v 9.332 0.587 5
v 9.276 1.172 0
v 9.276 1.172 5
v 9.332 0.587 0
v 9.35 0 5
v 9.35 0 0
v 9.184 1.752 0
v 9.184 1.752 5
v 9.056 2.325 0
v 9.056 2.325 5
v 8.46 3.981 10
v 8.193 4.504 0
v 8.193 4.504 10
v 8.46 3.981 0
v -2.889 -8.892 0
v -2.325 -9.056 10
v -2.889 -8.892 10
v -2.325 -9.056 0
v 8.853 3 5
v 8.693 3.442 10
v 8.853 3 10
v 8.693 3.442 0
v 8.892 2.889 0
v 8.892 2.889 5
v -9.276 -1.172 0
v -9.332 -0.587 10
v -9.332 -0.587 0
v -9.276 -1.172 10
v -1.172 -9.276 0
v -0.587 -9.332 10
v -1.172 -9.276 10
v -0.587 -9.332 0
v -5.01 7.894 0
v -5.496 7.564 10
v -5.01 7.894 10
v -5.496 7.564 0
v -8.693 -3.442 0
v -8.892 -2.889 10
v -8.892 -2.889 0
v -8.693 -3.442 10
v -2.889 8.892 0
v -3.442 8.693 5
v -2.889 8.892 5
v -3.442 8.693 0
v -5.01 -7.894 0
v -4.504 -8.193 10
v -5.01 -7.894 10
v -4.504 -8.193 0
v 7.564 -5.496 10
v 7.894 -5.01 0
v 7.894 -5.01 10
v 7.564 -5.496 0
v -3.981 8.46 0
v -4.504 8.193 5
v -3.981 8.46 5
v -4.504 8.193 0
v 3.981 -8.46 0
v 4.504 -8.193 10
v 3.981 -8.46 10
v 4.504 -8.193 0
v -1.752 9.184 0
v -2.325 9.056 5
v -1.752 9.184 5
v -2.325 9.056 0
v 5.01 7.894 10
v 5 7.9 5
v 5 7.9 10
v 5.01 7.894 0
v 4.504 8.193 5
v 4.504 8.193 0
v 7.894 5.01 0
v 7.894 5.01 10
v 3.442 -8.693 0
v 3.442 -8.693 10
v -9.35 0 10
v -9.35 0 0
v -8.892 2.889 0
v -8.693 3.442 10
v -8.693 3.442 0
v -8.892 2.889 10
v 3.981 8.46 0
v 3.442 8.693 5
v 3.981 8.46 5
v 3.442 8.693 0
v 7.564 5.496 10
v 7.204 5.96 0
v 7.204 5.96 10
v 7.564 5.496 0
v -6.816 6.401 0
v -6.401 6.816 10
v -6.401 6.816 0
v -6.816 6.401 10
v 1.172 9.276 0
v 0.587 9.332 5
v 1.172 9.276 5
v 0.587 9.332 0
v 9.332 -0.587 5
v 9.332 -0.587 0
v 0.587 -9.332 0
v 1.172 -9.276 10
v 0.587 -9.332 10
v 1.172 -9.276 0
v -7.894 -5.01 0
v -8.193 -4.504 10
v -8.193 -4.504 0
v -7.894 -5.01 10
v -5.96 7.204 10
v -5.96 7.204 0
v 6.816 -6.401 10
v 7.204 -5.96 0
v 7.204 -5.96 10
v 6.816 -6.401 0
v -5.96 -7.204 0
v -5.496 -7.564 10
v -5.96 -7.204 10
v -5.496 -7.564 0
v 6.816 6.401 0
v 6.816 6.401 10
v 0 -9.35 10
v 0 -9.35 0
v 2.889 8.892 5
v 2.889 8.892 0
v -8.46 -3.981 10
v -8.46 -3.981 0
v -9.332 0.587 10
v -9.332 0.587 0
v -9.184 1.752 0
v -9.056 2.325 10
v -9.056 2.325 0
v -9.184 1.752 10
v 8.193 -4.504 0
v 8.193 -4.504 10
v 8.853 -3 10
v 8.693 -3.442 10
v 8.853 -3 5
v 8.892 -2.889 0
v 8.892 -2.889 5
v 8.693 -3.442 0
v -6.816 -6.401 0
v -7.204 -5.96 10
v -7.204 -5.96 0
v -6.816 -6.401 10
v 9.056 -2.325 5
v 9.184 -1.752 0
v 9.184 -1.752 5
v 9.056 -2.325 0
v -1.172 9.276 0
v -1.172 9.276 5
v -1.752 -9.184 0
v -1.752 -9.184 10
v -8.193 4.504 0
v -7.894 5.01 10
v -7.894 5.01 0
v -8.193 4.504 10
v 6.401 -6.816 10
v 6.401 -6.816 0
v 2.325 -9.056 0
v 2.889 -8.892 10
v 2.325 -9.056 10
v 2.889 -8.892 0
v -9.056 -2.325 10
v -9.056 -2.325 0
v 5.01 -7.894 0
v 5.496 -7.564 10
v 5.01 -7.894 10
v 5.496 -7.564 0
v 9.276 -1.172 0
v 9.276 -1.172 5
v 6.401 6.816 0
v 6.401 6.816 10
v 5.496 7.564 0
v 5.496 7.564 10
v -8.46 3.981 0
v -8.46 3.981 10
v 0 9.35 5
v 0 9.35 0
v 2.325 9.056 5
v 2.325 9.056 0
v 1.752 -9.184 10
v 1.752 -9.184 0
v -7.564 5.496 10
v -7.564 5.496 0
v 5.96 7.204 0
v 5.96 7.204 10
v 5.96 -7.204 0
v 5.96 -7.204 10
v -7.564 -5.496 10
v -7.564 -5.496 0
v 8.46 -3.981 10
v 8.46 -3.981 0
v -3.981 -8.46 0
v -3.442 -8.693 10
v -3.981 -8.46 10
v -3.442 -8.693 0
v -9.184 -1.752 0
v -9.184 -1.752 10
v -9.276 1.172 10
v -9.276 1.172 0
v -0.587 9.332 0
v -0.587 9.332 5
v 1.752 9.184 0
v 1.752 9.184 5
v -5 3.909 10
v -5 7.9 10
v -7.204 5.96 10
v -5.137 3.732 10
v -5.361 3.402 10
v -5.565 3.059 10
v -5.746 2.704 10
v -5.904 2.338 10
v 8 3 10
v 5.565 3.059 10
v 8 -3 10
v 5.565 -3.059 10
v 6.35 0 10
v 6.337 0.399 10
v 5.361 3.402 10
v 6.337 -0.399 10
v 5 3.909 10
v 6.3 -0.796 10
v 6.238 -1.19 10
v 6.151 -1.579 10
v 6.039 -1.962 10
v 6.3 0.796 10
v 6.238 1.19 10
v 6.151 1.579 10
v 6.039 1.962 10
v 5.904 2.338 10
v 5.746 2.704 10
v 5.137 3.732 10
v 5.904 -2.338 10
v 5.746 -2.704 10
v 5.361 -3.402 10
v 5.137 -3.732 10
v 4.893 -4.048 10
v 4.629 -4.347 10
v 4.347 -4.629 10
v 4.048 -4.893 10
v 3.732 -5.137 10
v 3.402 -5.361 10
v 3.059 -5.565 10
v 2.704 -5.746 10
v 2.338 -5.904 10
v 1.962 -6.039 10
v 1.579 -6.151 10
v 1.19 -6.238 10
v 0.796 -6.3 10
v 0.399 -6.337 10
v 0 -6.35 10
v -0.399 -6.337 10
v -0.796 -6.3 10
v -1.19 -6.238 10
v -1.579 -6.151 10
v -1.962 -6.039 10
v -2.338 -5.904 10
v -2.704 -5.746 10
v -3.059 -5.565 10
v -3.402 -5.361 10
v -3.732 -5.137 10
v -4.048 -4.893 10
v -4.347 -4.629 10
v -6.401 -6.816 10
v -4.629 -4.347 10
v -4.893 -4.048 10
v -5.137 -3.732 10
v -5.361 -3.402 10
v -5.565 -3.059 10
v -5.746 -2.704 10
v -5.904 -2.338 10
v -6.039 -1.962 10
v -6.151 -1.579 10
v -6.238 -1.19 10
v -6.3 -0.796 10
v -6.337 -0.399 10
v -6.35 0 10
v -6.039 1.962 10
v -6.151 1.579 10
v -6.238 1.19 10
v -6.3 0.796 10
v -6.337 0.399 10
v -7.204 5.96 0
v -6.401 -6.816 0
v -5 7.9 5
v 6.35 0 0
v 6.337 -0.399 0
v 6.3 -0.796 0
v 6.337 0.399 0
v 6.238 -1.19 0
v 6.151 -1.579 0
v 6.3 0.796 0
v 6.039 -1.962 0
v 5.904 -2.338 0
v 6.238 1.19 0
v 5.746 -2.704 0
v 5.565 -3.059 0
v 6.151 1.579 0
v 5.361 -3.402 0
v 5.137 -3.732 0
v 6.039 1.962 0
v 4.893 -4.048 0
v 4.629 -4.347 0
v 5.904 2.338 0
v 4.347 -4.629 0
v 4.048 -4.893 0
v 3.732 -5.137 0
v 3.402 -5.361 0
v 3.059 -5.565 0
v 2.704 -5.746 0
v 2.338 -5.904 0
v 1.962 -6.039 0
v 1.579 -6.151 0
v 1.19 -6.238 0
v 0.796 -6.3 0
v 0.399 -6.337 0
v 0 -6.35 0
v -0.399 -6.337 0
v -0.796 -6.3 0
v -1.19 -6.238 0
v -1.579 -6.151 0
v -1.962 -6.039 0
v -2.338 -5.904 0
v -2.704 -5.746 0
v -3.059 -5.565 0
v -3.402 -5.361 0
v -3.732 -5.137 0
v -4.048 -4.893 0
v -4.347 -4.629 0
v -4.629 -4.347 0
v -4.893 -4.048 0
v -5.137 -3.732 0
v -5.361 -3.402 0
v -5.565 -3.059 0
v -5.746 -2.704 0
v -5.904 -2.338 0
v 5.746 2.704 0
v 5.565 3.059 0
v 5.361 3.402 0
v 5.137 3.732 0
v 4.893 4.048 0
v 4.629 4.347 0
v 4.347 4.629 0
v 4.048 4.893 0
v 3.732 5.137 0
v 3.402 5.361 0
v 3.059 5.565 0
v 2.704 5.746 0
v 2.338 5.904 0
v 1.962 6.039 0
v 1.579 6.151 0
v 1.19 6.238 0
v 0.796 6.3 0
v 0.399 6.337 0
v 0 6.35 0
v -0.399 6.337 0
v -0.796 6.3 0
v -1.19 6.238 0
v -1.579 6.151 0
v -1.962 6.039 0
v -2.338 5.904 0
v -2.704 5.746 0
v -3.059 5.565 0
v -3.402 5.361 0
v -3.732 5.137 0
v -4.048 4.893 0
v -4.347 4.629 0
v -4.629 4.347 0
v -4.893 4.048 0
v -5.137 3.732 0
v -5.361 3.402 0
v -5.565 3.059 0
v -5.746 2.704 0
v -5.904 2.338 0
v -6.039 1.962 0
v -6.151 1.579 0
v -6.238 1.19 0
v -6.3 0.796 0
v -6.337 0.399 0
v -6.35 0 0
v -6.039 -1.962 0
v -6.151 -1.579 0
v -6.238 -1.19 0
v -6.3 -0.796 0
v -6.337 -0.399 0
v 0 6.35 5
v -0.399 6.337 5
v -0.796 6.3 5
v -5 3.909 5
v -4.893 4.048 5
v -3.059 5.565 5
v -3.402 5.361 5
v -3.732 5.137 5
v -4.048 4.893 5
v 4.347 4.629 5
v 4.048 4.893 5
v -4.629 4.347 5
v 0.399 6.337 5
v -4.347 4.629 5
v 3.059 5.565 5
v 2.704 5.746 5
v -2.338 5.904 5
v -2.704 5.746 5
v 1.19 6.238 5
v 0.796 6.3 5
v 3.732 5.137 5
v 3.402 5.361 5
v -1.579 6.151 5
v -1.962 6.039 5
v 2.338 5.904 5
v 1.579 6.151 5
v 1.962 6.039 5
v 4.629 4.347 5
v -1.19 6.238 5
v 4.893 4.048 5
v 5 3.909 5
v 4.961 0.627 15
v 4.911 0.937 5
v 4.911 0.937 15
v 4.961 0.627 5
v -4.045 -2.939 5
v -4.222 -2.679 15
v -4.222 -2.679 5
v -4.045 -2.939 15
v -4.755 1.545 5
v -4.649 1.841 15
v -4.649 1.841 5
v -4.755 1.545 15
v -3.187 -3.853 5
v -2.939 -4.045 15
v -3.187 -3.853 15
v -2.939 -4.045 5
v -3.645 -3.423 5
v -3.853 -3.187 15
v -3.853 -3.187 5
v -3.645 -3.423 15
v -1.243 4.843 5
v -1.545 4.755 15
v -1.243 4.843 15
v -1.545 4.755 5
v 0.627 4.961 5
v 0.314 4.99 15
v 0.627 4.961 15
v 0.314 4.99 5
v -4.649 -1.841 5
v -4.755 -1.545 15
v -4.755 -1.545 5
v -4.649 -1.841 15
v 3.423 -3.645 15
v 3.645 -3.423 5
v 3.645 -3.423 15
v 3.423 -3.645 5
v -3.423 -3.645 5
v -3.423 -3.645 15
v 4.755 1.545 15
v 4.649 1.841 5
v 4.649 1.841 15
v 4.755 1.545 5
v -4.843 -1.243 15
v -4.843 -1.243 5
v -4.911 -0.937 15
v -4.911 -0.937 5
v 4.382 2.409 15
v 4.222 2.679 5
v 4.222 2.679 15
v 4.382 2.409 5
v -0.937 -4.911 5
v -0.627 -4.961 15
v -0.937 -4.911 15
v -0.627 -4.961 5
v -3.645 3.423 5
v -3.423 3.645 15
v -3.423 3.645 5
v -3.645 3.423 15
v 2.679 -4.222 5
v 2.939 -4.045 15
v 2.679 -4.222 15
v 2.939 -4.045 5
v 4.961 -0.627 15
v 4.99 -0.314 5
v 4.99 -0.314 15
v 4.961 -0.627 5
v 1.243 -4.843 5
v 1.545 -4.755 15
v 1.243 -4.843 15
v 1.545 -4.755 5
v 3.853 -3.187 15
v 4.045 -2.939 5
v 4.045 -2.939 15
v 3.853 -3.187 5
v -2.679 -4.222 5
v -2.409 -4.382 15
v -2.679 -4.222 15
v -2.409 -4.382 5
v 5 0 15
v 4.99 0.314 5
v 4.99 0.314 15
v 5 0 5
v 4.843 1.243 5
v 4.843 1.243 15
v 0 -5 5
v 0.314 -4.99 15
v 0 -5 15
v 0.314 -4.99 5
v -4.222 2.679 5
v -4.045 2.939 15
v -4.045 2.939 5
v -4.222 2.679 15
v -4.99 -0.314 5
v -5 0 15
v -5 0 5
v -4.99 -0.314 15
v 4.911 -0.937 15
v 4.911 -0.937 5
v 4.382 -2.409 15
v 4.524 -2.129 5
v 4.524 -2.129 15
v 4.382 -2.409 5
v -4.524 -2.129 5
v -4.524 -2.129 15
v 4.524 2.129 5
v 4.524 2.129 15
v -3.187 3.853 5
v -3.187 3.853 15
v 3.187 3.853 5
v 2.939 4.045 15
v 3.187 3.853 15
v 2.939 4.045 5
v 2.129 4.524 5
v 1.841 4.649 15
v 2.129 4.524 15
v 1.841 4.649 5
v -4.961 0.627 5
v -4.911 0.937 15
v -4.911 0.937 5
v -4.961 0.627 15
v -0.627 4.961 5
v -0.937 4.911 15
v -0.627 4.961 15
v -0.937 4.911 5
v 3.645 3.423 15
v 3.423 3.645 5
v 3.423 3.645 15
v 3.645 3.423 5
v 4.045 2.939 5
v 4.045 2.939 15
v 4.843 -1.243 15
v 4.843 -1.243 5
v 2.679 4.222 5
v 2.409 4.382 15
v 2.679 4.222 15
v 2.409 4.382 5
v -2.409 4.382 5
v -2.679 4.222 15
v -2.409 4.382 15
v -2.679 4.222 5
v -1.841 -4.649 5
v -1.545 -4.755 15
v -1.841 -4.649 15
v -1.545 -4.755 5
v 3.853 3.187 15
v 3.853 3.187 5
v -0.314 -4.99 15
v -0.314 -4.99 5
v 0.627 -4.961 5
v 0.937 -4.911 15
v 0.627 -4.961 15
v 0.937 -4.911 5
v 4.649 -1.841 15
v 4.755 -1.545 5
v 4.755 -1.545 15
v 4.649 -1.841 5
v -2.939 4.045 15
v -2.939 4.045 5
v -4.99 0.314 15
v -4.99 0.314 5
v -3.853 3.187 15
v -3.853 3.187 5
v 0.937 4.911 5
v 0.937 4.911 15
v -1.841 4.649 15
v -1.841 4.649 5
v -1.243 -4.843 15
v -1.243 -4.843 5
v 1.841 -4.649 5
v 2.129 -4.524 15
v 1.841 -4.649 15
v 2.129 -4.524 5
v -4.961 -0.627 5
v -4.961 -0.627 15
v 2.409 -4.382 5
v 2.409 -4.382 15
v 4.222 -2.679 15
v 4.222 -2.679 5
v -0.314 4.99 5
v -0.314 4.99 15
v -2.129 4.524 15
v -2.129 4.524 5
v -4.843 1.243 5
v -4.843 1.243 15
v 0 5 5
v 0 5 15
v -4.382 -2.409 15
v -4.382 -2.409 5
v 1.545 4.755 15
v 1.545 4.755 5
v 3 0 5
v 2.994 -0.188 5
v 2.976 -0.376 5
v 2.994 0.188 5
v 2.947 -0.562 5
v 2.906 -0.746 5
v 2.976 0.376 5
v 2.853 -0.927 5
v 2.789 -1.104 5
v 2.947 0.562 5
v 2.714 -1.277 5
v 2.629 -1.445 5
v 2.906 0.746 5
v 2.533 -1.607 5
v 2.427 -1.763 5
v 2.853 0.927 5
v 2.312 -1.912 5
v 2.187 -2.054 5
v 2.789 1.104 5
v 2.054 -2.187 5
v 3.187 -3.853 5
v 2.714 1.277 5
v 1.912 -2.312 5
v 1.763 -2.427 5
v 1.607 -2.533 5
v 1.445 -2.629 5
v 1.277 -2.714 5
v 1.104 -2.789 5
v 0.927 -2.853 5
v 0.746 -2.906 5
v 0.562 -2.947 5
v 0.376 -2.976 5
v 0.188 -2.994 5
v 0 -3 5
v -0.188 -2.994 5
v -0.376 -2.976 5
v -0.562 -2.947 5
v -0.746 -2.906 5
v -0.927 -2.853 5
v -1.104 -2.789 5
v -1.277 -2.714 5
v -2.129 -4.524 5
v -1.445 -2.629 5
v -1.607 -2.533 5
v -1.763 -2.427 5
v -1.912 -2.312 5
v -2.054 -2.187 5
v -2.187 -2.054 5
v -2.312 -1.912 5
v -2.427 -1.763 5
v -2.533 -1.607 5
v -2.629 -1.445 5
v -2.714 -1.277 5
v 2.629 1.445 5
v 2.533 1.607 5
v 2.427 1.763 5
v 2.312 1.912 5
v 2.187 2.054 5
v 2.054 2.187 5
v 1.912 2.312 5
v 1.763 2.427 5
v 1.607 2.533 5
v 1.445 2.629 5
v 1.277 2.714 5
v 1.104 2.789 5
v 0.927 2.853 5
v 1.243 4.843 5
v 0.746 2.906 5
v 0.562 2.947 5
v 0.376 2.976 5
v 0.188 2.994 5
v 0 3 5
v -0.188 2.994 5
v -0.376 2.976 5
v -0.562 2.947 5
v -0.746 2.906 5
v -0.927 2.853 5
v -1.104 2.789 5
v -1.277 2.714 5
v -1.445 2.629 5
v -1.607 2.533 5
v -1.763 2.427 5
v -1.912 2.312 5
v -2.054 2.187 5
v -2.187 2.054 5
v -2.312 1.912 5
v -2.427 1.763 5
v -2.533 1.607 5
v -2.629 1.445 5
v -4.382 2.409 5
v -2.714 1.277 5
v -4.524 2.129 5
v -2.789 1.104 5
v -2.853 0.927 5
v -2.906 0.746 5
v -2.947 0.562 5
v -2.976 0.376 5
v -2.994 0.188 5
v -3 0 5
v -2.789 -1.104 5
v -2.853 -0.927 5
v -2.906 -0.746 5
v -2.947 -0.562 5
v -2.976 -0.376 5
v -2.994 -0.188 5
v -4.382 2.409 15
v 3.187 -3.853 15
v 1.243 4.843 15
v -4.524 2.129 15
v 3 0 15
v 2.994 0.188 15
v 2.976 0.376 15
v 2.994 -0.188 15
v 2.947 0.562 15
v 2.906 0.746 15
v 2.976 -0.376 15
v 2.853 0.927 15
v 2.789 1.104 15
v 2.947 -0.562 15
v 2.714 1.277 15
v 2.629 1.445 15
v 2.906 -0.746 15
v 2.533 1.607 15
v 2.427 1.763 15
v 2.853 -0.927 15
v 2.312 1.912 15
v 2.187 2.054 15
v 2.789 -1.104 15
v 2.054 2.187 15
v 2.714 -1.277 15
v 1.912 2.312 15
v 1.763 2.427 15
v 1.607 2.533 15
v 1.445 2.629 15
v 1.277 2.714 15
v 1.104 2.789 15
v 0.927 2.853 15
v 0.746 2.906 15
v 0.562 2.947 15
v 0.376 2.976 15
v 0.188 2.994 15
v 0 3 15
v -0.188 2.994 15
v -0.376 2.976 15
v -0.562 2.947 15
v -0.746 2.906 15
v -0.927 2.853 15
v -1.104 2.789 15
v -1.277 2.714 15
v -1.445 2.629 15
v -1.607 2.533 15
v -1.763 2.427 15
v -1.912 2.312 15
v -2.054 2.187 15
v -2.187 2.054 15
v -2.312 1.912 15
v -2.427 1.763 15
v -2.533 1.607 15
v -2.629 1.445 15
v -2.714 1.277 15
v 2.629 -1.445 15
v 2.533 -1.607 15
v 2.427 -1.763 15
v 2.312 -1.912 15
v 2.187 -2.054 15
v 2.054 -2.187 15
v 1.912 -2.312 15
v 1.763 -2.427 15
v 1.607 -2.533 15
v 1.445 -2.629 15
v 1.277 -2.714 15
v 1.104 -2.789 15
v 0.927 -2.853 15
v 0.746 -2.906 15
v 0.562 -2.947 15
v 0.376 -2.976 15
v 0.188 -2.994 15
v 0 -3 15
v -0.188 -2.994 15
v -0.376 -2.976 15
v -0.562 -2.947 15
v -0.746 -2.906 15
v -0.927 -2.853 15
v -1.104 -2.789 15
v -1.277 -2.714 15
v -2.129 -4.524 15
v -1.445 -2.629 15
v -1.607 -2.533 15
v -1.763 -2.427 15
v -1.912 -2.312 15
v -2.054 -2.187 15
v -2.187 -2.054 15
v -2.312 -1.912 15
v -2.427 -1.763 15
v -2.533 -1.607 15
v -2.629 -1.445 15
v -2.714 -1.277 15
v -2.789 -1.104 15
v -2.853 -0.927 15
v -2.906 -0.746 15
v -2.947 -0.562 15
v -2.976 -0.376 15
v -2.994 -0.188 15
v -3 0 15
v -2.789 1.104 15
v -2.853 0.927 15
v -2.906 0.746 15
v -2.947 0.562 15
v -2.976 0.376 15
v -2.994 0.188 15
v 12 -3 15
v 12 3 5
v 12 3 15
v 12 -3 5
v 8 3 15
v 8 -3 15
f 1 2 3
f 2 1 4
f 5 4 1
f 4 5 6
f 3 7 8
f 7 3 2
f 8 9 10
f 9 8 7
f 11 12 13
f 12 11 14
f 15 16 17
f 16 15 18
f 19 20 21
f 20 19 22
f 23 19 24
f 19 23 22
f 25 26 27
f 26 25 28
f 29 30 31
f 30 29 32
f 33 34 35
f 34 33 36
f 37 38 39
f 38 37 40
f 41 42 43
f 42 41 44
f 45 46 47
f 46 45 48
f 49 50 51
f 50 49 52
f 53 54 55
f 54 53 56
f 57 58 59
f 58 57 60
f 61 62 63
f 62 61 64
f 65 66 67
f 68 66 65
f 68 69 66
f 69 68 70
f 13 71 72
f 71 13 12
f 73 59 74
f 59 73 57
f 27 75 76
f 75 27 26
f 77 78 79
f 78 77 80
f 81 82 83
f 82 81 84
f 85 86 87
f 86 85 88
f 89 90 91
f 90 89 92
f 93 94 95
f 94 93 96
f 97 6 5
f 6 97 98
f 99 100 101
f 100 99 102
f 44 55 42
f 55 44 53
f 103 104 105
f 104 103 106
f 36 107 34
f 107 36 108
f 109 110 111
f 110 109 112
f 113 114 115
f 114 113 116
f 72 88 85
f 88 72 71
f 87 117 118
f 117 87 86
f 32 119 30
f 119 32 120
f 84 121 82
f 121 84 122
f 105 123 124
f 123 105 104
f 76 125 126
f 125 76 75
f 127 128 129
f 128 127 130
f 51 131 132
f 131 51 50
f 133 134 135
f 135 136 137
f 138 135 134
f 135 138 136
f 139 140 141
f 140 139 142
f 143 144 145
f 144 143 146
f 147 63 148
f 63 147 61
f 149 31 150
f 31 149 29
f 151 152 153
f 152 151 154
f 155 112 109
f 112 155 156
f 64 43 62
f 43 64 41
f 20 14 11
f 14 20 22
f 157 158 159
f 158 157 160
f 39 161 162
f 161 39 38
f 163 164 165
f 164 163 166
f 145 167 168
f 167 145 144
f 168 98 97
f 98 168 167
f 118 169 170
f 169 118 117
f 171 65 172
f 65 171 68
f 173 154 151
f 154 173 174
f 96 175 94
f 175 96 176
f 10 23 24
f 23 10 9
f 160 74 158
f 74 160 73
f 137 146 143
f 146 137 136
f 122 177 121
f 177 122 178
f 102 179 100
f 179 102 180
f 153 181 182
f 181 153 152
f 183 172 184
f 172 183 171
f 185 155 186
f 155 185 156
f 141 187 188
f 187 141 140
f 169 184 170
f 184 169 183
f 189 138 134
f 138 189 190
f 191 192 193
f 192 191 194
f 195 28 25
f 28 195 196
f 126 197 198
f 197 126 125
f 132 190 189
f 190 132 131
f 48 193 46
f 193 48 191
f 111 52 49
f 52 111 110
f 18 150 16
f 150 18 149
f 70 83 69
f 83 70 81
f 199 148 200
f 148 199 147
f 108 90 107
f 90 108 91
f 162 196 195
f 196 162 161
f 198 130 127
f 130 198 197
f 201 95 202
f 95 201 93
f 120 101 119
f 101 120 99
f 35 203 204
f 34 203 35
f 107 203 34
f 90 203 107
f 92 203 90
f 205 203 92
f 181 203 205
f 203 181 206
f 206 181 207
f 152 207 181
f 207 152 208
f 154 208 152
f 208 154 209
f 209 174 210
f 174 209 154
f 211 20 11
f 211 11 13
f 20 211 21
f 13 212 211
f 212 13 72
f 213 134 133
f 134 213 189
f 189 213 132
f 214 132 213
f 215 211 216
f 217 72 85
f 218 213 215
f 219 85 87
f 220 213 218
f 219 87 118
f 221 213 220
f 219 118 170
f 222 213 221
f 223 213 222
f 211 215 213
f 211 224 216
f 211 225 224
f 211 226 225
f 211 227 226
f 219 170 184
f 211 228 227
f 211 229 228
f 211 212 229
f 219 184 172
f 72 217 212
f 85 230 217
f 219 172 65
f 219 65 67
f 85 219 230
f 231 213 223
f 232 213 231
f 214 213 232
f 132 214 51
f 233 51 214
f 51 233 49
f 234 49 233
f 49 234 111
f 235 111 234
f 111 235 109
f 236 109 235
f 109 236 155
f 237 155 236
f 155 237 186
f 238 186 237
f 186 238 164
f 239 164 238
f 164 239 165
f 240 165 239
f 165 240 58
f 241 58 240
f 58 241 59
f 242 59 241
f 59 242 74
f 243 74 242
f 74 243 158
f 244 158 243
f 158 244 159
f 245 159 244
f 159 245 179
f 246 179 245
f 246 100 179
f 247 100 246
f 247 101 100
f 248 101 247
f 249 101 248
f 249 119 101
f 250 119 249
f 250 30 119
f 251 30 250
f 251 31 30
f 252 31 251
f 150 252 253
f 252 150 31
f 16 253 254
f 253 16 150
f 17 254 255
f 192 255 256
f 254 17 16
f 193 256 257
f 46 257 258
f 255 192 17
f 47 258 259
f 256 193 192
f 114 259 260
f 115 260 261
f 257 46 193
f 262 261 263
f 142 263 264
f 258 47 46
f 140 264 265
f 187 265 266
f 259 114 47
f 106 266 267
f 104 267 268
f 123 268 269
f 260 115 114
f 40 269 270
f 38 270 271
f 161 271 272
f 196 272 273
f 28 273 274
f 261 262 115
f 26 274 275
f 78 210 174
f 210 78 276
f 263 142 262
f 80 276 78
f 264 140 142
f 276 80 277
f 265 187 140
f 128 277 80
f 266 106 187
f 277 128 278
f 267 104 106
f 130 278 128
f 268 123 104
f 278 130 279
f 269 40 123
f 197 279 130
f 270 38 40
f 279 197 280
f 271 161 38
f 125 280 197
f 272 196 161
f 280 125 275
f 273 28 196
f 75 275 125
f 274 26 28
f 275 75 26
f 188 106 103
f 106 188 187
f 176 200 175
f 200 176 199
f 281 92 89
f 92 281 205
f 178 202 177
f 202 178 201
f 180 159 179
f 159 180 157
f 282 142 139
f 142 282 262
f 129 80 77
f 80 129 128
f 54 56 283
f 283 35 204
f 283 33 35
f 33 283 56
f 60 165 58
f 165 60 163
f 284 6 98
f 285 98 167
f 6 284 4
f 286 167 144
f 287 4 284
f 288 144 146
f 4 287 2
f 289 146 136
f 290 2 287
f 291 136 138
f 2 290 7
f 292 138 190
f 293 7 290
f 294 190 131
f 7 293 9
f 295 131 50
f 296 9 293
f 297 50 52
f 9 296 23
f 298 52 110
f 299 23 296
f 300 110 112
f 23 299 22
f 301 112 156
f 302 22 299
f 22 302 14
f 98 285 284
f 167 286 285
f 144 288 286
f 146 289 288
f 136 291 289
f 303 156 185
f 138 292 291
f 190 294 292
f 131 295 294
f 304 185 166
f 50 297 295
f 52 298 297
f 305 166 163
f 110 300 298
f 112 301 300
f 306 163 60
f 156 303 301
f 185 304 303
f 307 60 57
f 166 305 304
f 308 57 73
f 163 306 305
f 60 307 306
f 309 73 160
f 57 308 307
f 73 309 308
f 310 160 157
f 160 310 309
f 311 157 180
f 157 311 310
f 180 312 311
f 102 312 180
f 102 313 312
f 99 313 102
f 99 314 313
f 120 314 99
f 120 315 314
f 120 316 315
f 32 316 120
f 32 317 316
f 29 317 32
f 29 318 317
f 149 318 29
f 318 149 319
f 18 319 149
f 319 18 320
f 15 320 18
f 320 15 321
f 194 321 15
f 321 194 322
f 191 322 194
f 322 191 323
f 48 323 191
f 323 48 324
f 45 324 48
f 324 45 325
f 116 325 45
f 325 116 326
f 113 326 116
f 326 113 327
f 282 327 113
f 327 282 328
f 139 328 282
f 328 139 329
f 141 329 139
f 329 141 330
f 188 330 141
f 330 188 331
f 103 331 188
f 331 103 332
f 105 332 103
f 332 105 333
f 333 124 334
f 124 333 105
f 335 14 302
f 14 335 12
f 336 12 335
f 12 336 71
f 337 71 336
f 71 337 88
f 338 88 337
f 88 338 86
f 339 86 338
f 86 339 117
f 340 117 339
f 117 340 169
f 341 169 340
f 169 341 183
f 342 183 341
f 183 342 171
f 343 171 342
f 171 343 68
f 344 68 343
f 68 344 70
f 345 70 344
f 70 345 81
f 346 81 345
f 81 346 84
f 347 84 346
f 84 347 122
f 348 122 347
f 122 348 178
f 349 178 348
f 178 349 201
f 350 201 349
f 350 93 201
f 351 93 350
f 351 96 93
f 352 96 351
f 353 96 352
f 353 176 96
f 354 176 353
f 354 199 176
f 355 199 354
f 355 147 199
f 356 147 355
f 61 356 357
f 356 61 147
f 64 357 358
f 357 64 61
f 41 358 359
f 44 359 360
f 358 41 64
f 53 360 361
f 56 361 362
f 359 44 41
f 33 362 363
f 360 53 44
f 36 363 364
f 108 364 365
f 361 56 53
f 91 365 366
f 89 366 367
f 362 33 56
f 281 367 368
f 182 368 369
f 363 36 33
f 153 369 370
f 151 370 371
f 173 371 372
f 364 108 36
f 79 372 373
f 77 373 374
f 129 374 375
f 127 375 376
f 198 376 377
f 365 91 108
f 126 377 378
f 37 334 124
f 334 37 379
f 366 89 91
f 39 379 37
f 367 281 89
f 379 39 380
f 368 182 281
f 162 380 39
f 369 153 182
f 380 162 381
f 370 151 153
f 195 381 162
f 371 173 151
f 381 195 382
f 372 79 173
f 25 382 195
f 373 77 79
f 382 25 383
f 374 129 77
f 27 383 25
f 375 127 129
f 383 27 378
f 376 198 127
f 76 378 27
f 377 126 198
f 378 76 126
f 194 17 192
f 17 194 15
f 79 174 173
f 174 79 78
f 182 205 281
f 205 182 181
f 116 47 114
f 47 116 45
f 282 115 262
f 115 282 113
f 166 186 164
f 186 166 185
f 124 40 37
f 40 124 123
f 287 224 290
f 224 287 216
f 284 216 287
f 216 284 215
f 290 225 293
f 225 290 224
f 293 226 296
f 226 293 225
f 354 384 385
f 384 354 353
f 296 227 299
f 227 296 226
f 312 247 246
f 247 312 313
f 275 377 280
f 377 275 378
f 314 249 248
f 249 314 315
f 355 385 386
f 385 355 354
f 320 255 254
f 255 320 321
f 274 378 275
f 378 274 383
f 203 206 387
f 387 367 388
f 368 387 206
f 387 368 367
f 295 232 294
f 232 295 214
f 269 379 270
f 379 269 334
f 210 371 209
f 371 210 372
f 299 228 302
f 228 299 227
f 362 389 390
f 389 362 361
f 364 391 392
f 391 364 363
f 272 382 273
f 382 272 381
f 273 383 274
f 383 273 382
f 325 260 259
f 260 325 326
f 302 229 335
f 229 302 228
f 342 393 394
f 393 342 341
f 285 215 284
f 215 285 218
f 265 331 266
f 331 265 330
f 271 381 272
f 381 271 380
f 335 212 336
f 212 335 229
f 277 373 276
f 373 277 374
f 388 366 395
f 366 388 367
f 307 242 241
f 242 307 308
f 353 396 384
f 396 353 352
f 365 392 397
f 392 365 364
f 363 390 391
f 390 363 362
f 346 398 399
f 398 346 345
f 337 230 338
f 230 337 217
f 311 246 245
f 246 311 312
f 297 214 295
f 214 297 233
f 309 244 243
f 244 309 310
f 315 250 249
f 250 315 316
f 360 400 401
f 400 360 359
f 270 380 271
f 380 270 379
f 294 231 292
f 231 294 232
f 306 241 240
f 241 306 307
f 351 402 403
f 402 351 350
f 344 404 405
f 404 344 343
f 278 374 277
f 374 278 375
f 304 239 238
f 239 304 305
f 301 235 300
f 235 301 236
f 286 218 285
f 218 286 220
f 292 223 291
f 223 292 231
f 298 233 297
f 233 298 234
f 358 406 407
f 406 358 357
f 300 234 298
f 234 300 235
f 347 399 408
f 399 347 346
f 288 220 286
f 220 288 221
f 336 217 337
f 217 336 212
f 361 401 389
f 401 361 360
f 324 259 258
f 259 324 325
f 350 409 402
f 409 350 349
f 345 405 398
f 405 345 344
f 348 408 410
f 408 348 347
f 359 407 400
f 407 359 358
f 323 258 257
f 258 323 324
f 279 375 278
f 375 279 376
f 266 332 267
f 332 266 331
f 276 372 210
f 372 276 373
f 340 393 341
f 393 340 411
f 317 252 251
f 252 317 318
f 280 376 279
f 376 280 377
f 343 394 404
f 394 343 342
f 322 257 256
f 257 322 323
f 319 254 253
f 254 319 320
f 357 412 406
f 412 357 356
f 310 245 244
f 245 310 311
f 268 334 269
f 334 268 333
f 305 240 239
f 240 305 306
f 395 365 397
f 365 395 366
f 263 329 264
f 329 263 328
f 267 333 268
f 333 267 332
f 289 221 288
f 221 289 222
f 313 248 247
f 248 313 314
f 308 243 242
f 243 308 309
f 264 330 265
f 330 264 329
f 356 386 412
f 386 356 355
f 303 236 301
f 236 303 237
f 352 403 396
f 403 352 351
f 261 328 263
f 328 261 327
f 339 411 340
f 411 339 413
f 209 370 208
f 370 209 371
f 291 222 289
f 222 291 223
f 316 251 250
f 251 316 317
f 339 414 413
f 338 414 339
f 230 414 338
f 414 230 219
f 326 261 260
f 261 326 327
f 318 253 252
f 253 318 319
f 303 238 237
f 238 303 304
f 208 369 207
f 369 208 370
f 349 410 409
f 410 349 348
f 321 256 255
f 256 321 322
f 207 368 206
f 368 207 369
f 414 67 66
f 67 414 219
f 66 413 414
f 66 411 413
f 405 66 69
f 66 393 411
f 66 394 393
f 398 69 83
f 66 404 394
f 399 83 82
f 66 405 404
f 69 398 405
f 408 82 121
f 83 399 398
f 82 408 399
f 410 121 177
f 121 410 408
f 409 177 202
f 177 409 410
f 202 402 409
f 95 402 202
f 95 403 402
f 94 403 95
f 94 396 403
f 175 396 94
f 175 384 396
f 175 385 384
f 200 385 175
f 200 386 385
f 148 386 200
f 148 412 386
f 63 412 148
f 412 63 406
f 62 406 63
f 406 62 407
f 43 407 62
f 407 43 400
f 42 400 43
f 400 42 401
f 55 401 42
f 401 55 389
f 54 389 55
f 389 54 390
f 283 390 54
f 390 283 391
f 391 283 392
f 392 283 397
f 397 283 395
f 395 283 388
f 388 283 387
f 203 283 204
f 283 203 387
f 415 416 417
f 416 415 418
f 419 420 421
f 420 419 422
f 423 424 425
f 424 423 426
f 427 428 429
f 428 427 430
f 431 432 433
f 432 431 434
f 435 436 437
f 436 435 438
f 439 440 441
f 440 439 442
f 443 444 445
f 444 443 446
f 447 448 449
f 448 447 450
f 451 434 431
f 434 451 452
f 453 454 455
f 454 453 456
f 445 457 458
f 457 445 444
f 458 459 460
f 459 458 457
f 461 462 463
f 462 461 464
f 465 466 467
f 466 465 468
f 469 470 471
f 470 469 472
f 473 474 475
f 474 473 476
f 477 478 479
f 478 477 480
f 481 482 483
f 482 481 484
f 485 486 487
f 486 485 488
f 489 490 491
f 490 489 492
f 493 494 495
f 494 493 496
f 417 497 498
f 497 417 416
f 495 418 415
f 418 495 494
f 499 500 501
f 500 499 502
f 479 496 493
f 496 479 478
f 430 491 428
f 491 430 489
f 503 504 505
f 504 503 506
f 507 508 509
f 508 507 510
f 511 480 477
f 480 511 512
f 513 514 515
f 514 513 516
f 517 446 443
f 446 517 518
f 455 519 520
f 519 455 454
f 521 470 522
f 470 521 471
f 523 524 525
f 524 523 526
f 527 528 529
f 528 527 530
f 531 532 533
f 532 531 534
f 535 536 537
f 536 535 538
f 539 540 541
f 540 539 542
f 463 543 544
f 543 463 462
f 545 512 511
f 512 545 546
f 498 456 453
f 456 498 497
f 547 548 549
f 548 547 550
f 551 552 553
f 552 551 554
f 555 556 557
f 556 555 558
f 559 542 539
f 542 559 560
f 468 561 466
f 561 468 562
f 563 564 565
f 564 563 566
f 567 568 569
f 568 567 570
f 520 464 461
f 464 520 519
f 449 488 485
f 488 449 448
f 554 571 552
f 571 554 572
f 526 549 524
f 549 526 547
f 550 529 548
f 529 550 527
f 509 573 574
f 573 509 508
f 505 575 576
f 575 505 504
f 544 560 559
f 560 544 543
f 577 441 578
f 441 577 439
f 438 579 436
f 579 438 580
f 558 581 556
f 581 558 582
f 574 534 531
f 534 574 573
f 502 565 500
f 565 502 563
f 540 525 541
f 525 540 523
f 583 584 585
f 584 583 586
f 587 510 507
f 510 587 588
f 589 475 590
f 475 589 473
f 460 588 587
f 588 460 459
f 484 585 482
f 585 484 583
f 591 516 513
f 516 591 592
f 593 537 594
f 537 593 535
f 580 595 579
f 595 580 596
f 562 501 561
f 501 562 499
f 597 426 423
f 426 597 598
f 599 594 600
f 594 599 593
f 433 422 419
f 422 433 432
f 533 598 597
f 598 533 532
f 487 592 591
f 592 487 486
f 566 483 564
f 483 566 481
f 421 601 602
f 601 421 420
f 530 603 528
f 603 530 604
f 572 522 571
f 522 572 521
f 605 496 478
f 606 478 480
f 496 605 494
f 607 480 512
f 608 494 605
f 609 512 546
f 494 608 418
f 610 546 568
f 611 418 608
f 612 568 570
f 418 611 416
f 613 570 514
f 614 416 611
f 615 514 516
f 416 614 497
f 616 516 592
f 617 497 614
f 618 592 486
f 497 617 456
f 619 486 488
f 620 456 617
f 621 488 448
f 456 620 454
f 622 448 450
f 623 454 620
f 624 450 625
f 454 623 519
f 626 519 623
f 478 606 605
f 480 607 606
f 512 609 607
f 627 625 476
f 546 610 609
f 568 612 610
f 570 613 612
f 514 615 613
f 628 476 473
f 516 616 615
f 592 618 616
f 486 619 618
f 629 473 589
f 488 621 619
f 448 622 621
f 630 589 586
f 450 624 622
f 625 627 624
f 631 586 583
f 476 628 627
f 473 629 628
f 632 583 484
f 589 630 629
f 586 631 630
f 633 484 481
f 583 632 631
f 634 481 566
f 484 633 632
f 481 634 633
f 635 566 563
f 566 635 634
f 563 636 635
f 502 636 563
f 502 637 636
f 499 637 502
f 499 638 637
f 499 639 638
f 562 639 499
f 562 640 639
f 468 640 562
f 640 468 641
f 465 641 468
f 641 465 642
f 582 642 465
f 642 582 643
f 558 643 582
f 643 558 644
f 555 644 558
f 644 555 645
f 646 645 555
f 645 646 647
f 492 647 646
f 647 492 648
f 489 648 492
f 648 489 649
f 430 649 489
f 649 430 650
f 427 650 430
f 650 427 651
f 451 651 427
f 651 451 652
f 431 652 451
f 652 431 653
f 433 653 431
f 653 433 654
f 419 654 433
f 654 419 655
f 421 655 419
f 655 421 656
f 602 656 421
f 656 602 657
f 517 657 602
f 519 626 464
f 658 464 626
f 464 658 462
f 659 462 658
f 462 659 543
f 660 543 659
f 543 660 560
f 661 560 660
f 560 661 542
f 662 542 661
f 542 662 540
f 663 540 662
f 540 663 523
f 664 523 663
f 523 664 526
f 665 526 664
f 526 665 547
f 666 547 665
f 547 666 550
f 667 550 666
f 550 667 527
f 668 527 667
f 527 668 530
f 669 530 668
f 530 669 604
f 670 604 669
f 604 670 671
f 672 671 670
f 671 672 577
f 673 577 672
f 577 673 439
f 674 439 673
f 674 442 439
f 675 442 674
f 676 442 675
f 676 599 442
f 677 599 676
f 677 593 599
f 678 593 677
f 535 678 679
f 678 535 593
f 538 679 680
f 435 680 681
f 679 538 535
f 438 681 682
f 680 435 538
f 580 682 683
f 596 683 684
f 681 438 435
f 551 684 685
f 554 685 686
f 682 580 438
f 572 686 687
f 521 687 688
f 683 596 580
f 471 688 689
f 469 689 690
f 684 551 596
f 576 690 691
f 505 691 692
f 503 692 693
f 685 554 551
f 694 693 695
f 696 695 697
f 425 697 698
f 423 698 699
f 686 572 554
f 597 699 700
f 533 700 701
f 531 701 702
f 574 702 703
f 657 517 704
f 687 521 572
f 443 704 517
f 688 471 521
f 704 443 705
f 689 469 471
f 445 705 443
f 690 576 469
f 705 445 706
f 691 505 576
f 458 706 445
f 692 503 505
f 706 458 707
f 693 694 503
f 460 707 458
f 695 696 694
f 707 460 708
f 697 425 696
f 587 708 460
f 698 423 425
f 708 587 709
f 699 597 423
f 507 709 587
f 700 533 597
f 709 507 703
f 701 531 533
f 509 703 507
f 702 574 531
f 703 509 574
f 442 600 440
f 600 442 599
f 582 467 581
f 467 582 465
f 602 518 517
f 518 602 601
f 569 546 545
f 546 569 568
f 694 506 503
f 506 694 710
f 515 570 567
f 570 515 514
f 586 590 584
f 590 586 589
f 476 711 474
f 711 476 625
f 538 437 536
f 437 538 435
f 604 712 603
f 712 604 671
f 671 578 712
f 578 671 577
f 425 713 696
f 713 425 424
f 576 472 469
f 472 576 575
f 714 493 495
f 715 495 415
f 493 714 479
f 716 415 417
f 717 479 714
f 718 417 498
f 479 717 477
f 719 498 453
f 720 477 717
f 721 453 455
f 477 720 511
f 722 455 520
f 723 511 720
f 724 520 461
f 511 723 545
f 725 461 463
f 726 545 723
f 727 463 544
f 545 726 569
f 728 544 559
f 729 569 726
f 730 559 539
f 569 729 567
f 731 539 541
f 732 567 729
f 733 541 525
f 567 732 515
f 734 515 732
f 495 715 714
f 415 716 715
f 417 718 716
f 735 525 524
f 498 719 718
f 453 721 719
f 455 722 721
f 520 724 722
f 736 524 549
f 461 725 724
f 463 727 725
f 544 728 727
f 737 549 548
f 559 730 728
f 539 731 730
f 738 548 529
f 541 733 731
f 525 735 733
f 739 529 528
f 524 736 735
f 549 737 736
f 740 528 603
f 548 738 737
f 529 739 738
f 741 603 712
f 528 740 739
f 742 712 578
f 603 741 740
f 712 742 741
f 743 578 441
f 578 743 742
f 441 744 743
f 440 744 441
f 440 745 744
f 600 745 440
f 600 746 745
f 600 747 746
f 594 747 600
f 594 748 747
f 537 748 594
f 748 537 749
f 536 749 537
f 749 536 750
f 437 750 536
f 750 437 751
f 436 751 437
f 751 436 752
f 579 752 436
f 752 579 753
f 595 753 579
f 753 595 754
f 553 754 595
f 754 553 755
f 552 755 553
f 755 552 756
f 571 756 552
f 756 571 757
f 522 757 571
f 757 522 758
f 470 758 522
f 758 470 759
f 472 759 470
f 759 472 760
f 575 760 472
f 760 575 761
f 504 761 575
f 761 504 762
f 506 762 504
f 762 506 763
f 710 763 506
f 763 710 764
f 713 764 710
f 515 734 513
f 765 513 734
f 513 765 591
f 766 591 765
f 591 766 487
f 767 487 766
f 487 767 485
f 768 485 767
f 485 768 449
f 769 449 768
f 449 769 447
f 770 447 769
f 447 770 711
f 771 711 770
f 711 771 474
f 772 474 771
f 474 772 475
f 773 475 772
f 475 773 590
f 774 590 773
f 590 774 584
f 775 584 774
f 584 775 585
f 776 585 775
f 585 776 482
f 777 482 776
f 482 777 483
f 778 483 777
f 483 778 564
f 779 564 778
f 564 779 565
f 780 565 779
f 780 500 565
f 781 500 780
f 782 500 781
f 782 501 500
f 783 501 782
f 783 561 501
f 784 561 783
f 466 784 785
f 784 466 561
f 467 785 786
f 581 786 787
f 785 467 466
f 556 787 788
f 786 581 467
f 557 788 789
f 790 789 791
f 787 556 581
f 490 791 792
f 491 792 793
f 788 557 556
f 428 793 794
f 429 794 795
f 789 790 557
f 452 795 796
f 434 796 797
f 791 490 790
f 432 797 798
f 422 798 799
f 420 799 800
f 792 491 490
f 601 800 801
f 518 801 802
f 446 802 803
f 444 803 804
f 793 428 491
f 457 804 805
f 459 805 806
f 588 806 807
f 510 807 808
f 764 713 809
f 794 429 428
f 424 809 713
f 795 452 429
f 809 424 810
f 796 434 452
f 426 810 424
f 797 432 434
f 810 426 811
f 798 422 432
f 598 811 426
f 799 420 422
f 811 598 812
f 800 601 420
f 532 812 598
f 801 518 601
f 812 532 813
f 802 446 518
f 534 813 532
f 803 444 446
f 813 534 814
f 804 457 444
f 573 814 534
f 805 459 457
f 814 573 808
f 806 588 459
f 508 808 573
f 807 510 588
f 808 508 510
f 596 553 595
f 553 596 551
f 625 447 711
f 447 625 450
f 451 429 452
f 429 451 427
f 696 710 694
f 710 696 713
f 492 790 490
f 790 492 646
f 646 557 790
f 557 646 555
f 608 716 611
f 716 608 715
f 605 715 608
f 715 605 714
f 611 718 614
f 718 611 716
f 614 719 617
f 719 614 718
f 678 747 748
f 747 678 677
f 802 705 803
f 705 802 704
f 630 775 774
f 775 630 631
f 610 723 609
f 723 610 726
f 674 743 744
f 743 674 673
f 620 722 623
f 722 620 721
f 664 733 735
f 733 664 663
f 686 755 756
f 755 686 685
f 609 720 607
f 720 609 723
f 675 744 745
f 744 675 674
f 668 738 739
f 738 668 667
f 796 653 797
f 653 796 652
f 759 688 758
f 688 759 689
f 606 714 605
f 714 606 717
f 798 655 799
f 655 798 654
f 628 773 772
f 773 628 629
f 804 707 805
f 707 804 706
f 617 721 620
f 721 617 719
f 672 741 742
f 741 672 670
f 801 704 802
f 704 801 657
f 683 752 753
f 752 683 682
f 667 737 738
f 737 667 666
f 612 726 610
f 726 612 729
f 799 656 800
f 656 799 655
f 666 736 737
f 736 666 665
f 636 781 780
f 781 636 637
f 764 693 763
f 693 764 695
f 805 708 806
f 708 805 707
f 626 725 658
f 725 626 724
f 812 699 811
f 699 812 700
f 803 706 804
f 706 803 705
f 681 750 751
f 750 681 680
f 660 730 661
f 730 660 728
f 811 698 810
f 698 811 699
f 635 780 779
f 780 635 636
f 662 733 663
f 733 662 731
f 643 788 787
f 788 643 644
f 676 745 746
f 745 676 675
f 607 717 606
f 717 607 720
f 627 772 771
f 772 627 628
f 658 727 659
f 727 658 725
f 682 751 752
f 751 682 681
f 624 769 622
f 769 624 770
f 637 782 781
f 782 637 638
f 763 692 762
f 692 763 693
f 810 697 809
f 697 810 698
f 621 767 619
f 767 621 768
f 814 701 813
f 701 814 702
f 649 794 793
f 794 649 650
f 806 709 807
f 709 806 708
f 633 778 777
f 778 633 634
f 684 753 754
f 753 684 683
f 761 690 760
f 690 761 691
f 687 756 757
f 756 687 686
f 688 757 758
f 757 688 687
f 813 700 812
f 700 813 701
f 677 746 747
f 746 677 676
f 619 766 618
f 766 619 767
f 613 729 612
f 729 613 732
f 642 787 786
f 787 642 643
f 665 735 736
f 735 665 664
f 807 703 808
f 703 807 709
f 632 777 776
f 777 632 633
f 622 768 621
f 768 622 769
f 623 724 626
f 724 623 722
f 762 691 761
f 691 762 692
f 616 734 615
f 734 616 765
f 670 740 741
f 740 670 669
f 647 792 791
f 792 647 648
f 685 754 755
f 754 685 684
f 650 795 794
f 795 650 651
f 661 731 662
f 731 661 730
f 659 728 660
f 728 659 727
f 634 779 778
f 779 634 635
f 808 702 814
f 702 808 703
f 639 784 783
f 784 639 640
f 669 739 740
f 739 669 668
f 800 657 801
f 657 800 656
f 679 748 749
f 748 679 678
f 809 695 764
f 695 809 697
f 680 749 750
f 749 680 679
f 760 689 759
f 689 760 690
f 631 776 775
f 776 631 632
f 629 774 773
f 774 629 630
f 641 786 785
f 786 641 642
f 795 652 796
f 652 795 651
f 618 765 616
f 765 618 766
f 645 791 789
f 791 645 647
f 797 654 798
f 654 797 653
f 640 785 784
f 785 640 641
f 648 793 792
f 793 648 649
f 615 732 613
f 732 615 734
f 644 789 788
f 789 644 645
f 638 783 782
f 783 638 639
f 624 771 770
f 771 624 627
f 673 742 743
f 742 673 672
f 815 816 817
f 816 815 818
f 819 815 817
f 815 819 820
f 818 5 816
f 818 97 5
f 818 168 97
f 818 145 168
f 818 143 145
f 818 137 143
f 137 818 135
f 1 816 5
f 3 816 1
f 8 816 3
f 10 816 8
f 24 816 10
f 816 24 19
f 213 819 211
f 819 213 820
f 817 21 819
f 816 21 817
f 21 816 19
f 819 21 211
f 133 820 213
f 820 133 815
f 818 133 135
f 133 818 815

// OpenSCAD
// Snap-on Clip for Lab Stand and Tubing
// Orientation: Flat on XY plane, building up in +Z.
// Units: Millimetres.

// --- Dimensions ---
// Rod Stand Dimensions
$rod_diameter = 12.7;      // Inner diameter of rod ring
$rod_wall = 3;             // Wall thickness of rod ring
$rod_outer = $rod_diameter + 2 * $rod_wall; // 18.7 mm
$rod_opening_width = 10;   // Width of the cutout on the -X side
$rod_opening_y_limit = 5;  // Half-height of the cutout on the -X side

// Tubing Dimensions
$tube_diameter = 6;        // Inner diameter of tubing ring
$tube_wall = 2;            // Wall thickness of tubing ring
$tube_outer = $tube_diameter + 2 * $tube_wall; // 10 mm
$tube_center_x = 15;       // X position of tubing ring center
$tube_opening_width = 4.5; // Width of the cutout on the +X side
$tube_opening_y_limit = 2.25; // Half-height of the cutout on the +X side

// Bridge Dimensions
$bridge_width_x = 4;       // Width of bridge in X (from 8 to 12)
$bridge_height_y = 6;      // Height of bridge in Y
$bridge_z = 10;            // Height of extrusion (Target Z)

// --- Configuration ---
$fn = 100;                 // Smoothness for curved shapes

// --- Main Body ---
// We define the 2D profile in the XY plane and extrude it to Z.
// The profile is constructed using difference() to cut holes and openings.

difference() {
    // 1. Create the solid base shape (Union of Rod Ring, Tubing Ring, and Bridge)
    union() {
        // --- Rod Ring (Left) ---
        // Constructed as a single difference to ensure the slot is clean
        difference() {
            // Outer cylinder
            cylinder(
                h = $bridge_z,
                d = $rod_outer,
                center = [0, 0, $bridge_z/2]
            );
            
            // Inner hole for the rod
            cylinder(
                h = $bridge_z,
                d = $rod_diameter,
                center = [0, 0, $bridge_z/2]
            );
            
            // Cut the -X side opening (Rectangular slot)
            // Position: Centered at x=0, extending to the left.
            // Height: Must cover the full Z height of the part.
            translate([-($rod_opening_width/2), 0, $bridge_z/2]) {
                cube([
                    $rod_opening_width, 
                    $rod_opening_y_limit * 2, 
                    $bridge_z
                ]);
            }
        }
        
        // --- Tubing Ring (Right) ---
        // Outer circle centered at x = $tube_center_x
        translate([0, 0, $bridge_z/2]) {
            difference() {
                // Outer cylinder
                cylinder(
                    h = $bridge_z,
                    d = $tube_outer,
                    center = [$tube_center_x, 0, $bridge_z/2]
                );
                
                // Inner hole for the tubing
                cylinder(
                    h = $bridge_z,
                    d = $tube_diameter,
                    center = [$tube_center_x, 0, $bridge_z/2]
                );
                
                // Cut the +X side opening (Rectangular slot)
                // Position: Centered at x=15, extending to the right.
                translate([$tube_center_x + ($tube_opening_width/2), 0, $bridge_z/2]) {
                    cube([
                        $tube_opening_width, 
                        $tube_opening_y_limit * 2, 
                        $bridge_z
                    ]);
                }
            }
        }
        
        // --- Solid Bridge ---
        // Joins the two rings. 
        // Spans from x = 8 to x = 12.
        // Height in Y is 6 mm, centered at y=0.
        translate([8, -($bridge_height_y/2), $bridge_z/2]) {
            cube([
                $bridge_width_x, 
                $bridge_height_y, 
                $bridge_z
            ]);
        }
    }
}
